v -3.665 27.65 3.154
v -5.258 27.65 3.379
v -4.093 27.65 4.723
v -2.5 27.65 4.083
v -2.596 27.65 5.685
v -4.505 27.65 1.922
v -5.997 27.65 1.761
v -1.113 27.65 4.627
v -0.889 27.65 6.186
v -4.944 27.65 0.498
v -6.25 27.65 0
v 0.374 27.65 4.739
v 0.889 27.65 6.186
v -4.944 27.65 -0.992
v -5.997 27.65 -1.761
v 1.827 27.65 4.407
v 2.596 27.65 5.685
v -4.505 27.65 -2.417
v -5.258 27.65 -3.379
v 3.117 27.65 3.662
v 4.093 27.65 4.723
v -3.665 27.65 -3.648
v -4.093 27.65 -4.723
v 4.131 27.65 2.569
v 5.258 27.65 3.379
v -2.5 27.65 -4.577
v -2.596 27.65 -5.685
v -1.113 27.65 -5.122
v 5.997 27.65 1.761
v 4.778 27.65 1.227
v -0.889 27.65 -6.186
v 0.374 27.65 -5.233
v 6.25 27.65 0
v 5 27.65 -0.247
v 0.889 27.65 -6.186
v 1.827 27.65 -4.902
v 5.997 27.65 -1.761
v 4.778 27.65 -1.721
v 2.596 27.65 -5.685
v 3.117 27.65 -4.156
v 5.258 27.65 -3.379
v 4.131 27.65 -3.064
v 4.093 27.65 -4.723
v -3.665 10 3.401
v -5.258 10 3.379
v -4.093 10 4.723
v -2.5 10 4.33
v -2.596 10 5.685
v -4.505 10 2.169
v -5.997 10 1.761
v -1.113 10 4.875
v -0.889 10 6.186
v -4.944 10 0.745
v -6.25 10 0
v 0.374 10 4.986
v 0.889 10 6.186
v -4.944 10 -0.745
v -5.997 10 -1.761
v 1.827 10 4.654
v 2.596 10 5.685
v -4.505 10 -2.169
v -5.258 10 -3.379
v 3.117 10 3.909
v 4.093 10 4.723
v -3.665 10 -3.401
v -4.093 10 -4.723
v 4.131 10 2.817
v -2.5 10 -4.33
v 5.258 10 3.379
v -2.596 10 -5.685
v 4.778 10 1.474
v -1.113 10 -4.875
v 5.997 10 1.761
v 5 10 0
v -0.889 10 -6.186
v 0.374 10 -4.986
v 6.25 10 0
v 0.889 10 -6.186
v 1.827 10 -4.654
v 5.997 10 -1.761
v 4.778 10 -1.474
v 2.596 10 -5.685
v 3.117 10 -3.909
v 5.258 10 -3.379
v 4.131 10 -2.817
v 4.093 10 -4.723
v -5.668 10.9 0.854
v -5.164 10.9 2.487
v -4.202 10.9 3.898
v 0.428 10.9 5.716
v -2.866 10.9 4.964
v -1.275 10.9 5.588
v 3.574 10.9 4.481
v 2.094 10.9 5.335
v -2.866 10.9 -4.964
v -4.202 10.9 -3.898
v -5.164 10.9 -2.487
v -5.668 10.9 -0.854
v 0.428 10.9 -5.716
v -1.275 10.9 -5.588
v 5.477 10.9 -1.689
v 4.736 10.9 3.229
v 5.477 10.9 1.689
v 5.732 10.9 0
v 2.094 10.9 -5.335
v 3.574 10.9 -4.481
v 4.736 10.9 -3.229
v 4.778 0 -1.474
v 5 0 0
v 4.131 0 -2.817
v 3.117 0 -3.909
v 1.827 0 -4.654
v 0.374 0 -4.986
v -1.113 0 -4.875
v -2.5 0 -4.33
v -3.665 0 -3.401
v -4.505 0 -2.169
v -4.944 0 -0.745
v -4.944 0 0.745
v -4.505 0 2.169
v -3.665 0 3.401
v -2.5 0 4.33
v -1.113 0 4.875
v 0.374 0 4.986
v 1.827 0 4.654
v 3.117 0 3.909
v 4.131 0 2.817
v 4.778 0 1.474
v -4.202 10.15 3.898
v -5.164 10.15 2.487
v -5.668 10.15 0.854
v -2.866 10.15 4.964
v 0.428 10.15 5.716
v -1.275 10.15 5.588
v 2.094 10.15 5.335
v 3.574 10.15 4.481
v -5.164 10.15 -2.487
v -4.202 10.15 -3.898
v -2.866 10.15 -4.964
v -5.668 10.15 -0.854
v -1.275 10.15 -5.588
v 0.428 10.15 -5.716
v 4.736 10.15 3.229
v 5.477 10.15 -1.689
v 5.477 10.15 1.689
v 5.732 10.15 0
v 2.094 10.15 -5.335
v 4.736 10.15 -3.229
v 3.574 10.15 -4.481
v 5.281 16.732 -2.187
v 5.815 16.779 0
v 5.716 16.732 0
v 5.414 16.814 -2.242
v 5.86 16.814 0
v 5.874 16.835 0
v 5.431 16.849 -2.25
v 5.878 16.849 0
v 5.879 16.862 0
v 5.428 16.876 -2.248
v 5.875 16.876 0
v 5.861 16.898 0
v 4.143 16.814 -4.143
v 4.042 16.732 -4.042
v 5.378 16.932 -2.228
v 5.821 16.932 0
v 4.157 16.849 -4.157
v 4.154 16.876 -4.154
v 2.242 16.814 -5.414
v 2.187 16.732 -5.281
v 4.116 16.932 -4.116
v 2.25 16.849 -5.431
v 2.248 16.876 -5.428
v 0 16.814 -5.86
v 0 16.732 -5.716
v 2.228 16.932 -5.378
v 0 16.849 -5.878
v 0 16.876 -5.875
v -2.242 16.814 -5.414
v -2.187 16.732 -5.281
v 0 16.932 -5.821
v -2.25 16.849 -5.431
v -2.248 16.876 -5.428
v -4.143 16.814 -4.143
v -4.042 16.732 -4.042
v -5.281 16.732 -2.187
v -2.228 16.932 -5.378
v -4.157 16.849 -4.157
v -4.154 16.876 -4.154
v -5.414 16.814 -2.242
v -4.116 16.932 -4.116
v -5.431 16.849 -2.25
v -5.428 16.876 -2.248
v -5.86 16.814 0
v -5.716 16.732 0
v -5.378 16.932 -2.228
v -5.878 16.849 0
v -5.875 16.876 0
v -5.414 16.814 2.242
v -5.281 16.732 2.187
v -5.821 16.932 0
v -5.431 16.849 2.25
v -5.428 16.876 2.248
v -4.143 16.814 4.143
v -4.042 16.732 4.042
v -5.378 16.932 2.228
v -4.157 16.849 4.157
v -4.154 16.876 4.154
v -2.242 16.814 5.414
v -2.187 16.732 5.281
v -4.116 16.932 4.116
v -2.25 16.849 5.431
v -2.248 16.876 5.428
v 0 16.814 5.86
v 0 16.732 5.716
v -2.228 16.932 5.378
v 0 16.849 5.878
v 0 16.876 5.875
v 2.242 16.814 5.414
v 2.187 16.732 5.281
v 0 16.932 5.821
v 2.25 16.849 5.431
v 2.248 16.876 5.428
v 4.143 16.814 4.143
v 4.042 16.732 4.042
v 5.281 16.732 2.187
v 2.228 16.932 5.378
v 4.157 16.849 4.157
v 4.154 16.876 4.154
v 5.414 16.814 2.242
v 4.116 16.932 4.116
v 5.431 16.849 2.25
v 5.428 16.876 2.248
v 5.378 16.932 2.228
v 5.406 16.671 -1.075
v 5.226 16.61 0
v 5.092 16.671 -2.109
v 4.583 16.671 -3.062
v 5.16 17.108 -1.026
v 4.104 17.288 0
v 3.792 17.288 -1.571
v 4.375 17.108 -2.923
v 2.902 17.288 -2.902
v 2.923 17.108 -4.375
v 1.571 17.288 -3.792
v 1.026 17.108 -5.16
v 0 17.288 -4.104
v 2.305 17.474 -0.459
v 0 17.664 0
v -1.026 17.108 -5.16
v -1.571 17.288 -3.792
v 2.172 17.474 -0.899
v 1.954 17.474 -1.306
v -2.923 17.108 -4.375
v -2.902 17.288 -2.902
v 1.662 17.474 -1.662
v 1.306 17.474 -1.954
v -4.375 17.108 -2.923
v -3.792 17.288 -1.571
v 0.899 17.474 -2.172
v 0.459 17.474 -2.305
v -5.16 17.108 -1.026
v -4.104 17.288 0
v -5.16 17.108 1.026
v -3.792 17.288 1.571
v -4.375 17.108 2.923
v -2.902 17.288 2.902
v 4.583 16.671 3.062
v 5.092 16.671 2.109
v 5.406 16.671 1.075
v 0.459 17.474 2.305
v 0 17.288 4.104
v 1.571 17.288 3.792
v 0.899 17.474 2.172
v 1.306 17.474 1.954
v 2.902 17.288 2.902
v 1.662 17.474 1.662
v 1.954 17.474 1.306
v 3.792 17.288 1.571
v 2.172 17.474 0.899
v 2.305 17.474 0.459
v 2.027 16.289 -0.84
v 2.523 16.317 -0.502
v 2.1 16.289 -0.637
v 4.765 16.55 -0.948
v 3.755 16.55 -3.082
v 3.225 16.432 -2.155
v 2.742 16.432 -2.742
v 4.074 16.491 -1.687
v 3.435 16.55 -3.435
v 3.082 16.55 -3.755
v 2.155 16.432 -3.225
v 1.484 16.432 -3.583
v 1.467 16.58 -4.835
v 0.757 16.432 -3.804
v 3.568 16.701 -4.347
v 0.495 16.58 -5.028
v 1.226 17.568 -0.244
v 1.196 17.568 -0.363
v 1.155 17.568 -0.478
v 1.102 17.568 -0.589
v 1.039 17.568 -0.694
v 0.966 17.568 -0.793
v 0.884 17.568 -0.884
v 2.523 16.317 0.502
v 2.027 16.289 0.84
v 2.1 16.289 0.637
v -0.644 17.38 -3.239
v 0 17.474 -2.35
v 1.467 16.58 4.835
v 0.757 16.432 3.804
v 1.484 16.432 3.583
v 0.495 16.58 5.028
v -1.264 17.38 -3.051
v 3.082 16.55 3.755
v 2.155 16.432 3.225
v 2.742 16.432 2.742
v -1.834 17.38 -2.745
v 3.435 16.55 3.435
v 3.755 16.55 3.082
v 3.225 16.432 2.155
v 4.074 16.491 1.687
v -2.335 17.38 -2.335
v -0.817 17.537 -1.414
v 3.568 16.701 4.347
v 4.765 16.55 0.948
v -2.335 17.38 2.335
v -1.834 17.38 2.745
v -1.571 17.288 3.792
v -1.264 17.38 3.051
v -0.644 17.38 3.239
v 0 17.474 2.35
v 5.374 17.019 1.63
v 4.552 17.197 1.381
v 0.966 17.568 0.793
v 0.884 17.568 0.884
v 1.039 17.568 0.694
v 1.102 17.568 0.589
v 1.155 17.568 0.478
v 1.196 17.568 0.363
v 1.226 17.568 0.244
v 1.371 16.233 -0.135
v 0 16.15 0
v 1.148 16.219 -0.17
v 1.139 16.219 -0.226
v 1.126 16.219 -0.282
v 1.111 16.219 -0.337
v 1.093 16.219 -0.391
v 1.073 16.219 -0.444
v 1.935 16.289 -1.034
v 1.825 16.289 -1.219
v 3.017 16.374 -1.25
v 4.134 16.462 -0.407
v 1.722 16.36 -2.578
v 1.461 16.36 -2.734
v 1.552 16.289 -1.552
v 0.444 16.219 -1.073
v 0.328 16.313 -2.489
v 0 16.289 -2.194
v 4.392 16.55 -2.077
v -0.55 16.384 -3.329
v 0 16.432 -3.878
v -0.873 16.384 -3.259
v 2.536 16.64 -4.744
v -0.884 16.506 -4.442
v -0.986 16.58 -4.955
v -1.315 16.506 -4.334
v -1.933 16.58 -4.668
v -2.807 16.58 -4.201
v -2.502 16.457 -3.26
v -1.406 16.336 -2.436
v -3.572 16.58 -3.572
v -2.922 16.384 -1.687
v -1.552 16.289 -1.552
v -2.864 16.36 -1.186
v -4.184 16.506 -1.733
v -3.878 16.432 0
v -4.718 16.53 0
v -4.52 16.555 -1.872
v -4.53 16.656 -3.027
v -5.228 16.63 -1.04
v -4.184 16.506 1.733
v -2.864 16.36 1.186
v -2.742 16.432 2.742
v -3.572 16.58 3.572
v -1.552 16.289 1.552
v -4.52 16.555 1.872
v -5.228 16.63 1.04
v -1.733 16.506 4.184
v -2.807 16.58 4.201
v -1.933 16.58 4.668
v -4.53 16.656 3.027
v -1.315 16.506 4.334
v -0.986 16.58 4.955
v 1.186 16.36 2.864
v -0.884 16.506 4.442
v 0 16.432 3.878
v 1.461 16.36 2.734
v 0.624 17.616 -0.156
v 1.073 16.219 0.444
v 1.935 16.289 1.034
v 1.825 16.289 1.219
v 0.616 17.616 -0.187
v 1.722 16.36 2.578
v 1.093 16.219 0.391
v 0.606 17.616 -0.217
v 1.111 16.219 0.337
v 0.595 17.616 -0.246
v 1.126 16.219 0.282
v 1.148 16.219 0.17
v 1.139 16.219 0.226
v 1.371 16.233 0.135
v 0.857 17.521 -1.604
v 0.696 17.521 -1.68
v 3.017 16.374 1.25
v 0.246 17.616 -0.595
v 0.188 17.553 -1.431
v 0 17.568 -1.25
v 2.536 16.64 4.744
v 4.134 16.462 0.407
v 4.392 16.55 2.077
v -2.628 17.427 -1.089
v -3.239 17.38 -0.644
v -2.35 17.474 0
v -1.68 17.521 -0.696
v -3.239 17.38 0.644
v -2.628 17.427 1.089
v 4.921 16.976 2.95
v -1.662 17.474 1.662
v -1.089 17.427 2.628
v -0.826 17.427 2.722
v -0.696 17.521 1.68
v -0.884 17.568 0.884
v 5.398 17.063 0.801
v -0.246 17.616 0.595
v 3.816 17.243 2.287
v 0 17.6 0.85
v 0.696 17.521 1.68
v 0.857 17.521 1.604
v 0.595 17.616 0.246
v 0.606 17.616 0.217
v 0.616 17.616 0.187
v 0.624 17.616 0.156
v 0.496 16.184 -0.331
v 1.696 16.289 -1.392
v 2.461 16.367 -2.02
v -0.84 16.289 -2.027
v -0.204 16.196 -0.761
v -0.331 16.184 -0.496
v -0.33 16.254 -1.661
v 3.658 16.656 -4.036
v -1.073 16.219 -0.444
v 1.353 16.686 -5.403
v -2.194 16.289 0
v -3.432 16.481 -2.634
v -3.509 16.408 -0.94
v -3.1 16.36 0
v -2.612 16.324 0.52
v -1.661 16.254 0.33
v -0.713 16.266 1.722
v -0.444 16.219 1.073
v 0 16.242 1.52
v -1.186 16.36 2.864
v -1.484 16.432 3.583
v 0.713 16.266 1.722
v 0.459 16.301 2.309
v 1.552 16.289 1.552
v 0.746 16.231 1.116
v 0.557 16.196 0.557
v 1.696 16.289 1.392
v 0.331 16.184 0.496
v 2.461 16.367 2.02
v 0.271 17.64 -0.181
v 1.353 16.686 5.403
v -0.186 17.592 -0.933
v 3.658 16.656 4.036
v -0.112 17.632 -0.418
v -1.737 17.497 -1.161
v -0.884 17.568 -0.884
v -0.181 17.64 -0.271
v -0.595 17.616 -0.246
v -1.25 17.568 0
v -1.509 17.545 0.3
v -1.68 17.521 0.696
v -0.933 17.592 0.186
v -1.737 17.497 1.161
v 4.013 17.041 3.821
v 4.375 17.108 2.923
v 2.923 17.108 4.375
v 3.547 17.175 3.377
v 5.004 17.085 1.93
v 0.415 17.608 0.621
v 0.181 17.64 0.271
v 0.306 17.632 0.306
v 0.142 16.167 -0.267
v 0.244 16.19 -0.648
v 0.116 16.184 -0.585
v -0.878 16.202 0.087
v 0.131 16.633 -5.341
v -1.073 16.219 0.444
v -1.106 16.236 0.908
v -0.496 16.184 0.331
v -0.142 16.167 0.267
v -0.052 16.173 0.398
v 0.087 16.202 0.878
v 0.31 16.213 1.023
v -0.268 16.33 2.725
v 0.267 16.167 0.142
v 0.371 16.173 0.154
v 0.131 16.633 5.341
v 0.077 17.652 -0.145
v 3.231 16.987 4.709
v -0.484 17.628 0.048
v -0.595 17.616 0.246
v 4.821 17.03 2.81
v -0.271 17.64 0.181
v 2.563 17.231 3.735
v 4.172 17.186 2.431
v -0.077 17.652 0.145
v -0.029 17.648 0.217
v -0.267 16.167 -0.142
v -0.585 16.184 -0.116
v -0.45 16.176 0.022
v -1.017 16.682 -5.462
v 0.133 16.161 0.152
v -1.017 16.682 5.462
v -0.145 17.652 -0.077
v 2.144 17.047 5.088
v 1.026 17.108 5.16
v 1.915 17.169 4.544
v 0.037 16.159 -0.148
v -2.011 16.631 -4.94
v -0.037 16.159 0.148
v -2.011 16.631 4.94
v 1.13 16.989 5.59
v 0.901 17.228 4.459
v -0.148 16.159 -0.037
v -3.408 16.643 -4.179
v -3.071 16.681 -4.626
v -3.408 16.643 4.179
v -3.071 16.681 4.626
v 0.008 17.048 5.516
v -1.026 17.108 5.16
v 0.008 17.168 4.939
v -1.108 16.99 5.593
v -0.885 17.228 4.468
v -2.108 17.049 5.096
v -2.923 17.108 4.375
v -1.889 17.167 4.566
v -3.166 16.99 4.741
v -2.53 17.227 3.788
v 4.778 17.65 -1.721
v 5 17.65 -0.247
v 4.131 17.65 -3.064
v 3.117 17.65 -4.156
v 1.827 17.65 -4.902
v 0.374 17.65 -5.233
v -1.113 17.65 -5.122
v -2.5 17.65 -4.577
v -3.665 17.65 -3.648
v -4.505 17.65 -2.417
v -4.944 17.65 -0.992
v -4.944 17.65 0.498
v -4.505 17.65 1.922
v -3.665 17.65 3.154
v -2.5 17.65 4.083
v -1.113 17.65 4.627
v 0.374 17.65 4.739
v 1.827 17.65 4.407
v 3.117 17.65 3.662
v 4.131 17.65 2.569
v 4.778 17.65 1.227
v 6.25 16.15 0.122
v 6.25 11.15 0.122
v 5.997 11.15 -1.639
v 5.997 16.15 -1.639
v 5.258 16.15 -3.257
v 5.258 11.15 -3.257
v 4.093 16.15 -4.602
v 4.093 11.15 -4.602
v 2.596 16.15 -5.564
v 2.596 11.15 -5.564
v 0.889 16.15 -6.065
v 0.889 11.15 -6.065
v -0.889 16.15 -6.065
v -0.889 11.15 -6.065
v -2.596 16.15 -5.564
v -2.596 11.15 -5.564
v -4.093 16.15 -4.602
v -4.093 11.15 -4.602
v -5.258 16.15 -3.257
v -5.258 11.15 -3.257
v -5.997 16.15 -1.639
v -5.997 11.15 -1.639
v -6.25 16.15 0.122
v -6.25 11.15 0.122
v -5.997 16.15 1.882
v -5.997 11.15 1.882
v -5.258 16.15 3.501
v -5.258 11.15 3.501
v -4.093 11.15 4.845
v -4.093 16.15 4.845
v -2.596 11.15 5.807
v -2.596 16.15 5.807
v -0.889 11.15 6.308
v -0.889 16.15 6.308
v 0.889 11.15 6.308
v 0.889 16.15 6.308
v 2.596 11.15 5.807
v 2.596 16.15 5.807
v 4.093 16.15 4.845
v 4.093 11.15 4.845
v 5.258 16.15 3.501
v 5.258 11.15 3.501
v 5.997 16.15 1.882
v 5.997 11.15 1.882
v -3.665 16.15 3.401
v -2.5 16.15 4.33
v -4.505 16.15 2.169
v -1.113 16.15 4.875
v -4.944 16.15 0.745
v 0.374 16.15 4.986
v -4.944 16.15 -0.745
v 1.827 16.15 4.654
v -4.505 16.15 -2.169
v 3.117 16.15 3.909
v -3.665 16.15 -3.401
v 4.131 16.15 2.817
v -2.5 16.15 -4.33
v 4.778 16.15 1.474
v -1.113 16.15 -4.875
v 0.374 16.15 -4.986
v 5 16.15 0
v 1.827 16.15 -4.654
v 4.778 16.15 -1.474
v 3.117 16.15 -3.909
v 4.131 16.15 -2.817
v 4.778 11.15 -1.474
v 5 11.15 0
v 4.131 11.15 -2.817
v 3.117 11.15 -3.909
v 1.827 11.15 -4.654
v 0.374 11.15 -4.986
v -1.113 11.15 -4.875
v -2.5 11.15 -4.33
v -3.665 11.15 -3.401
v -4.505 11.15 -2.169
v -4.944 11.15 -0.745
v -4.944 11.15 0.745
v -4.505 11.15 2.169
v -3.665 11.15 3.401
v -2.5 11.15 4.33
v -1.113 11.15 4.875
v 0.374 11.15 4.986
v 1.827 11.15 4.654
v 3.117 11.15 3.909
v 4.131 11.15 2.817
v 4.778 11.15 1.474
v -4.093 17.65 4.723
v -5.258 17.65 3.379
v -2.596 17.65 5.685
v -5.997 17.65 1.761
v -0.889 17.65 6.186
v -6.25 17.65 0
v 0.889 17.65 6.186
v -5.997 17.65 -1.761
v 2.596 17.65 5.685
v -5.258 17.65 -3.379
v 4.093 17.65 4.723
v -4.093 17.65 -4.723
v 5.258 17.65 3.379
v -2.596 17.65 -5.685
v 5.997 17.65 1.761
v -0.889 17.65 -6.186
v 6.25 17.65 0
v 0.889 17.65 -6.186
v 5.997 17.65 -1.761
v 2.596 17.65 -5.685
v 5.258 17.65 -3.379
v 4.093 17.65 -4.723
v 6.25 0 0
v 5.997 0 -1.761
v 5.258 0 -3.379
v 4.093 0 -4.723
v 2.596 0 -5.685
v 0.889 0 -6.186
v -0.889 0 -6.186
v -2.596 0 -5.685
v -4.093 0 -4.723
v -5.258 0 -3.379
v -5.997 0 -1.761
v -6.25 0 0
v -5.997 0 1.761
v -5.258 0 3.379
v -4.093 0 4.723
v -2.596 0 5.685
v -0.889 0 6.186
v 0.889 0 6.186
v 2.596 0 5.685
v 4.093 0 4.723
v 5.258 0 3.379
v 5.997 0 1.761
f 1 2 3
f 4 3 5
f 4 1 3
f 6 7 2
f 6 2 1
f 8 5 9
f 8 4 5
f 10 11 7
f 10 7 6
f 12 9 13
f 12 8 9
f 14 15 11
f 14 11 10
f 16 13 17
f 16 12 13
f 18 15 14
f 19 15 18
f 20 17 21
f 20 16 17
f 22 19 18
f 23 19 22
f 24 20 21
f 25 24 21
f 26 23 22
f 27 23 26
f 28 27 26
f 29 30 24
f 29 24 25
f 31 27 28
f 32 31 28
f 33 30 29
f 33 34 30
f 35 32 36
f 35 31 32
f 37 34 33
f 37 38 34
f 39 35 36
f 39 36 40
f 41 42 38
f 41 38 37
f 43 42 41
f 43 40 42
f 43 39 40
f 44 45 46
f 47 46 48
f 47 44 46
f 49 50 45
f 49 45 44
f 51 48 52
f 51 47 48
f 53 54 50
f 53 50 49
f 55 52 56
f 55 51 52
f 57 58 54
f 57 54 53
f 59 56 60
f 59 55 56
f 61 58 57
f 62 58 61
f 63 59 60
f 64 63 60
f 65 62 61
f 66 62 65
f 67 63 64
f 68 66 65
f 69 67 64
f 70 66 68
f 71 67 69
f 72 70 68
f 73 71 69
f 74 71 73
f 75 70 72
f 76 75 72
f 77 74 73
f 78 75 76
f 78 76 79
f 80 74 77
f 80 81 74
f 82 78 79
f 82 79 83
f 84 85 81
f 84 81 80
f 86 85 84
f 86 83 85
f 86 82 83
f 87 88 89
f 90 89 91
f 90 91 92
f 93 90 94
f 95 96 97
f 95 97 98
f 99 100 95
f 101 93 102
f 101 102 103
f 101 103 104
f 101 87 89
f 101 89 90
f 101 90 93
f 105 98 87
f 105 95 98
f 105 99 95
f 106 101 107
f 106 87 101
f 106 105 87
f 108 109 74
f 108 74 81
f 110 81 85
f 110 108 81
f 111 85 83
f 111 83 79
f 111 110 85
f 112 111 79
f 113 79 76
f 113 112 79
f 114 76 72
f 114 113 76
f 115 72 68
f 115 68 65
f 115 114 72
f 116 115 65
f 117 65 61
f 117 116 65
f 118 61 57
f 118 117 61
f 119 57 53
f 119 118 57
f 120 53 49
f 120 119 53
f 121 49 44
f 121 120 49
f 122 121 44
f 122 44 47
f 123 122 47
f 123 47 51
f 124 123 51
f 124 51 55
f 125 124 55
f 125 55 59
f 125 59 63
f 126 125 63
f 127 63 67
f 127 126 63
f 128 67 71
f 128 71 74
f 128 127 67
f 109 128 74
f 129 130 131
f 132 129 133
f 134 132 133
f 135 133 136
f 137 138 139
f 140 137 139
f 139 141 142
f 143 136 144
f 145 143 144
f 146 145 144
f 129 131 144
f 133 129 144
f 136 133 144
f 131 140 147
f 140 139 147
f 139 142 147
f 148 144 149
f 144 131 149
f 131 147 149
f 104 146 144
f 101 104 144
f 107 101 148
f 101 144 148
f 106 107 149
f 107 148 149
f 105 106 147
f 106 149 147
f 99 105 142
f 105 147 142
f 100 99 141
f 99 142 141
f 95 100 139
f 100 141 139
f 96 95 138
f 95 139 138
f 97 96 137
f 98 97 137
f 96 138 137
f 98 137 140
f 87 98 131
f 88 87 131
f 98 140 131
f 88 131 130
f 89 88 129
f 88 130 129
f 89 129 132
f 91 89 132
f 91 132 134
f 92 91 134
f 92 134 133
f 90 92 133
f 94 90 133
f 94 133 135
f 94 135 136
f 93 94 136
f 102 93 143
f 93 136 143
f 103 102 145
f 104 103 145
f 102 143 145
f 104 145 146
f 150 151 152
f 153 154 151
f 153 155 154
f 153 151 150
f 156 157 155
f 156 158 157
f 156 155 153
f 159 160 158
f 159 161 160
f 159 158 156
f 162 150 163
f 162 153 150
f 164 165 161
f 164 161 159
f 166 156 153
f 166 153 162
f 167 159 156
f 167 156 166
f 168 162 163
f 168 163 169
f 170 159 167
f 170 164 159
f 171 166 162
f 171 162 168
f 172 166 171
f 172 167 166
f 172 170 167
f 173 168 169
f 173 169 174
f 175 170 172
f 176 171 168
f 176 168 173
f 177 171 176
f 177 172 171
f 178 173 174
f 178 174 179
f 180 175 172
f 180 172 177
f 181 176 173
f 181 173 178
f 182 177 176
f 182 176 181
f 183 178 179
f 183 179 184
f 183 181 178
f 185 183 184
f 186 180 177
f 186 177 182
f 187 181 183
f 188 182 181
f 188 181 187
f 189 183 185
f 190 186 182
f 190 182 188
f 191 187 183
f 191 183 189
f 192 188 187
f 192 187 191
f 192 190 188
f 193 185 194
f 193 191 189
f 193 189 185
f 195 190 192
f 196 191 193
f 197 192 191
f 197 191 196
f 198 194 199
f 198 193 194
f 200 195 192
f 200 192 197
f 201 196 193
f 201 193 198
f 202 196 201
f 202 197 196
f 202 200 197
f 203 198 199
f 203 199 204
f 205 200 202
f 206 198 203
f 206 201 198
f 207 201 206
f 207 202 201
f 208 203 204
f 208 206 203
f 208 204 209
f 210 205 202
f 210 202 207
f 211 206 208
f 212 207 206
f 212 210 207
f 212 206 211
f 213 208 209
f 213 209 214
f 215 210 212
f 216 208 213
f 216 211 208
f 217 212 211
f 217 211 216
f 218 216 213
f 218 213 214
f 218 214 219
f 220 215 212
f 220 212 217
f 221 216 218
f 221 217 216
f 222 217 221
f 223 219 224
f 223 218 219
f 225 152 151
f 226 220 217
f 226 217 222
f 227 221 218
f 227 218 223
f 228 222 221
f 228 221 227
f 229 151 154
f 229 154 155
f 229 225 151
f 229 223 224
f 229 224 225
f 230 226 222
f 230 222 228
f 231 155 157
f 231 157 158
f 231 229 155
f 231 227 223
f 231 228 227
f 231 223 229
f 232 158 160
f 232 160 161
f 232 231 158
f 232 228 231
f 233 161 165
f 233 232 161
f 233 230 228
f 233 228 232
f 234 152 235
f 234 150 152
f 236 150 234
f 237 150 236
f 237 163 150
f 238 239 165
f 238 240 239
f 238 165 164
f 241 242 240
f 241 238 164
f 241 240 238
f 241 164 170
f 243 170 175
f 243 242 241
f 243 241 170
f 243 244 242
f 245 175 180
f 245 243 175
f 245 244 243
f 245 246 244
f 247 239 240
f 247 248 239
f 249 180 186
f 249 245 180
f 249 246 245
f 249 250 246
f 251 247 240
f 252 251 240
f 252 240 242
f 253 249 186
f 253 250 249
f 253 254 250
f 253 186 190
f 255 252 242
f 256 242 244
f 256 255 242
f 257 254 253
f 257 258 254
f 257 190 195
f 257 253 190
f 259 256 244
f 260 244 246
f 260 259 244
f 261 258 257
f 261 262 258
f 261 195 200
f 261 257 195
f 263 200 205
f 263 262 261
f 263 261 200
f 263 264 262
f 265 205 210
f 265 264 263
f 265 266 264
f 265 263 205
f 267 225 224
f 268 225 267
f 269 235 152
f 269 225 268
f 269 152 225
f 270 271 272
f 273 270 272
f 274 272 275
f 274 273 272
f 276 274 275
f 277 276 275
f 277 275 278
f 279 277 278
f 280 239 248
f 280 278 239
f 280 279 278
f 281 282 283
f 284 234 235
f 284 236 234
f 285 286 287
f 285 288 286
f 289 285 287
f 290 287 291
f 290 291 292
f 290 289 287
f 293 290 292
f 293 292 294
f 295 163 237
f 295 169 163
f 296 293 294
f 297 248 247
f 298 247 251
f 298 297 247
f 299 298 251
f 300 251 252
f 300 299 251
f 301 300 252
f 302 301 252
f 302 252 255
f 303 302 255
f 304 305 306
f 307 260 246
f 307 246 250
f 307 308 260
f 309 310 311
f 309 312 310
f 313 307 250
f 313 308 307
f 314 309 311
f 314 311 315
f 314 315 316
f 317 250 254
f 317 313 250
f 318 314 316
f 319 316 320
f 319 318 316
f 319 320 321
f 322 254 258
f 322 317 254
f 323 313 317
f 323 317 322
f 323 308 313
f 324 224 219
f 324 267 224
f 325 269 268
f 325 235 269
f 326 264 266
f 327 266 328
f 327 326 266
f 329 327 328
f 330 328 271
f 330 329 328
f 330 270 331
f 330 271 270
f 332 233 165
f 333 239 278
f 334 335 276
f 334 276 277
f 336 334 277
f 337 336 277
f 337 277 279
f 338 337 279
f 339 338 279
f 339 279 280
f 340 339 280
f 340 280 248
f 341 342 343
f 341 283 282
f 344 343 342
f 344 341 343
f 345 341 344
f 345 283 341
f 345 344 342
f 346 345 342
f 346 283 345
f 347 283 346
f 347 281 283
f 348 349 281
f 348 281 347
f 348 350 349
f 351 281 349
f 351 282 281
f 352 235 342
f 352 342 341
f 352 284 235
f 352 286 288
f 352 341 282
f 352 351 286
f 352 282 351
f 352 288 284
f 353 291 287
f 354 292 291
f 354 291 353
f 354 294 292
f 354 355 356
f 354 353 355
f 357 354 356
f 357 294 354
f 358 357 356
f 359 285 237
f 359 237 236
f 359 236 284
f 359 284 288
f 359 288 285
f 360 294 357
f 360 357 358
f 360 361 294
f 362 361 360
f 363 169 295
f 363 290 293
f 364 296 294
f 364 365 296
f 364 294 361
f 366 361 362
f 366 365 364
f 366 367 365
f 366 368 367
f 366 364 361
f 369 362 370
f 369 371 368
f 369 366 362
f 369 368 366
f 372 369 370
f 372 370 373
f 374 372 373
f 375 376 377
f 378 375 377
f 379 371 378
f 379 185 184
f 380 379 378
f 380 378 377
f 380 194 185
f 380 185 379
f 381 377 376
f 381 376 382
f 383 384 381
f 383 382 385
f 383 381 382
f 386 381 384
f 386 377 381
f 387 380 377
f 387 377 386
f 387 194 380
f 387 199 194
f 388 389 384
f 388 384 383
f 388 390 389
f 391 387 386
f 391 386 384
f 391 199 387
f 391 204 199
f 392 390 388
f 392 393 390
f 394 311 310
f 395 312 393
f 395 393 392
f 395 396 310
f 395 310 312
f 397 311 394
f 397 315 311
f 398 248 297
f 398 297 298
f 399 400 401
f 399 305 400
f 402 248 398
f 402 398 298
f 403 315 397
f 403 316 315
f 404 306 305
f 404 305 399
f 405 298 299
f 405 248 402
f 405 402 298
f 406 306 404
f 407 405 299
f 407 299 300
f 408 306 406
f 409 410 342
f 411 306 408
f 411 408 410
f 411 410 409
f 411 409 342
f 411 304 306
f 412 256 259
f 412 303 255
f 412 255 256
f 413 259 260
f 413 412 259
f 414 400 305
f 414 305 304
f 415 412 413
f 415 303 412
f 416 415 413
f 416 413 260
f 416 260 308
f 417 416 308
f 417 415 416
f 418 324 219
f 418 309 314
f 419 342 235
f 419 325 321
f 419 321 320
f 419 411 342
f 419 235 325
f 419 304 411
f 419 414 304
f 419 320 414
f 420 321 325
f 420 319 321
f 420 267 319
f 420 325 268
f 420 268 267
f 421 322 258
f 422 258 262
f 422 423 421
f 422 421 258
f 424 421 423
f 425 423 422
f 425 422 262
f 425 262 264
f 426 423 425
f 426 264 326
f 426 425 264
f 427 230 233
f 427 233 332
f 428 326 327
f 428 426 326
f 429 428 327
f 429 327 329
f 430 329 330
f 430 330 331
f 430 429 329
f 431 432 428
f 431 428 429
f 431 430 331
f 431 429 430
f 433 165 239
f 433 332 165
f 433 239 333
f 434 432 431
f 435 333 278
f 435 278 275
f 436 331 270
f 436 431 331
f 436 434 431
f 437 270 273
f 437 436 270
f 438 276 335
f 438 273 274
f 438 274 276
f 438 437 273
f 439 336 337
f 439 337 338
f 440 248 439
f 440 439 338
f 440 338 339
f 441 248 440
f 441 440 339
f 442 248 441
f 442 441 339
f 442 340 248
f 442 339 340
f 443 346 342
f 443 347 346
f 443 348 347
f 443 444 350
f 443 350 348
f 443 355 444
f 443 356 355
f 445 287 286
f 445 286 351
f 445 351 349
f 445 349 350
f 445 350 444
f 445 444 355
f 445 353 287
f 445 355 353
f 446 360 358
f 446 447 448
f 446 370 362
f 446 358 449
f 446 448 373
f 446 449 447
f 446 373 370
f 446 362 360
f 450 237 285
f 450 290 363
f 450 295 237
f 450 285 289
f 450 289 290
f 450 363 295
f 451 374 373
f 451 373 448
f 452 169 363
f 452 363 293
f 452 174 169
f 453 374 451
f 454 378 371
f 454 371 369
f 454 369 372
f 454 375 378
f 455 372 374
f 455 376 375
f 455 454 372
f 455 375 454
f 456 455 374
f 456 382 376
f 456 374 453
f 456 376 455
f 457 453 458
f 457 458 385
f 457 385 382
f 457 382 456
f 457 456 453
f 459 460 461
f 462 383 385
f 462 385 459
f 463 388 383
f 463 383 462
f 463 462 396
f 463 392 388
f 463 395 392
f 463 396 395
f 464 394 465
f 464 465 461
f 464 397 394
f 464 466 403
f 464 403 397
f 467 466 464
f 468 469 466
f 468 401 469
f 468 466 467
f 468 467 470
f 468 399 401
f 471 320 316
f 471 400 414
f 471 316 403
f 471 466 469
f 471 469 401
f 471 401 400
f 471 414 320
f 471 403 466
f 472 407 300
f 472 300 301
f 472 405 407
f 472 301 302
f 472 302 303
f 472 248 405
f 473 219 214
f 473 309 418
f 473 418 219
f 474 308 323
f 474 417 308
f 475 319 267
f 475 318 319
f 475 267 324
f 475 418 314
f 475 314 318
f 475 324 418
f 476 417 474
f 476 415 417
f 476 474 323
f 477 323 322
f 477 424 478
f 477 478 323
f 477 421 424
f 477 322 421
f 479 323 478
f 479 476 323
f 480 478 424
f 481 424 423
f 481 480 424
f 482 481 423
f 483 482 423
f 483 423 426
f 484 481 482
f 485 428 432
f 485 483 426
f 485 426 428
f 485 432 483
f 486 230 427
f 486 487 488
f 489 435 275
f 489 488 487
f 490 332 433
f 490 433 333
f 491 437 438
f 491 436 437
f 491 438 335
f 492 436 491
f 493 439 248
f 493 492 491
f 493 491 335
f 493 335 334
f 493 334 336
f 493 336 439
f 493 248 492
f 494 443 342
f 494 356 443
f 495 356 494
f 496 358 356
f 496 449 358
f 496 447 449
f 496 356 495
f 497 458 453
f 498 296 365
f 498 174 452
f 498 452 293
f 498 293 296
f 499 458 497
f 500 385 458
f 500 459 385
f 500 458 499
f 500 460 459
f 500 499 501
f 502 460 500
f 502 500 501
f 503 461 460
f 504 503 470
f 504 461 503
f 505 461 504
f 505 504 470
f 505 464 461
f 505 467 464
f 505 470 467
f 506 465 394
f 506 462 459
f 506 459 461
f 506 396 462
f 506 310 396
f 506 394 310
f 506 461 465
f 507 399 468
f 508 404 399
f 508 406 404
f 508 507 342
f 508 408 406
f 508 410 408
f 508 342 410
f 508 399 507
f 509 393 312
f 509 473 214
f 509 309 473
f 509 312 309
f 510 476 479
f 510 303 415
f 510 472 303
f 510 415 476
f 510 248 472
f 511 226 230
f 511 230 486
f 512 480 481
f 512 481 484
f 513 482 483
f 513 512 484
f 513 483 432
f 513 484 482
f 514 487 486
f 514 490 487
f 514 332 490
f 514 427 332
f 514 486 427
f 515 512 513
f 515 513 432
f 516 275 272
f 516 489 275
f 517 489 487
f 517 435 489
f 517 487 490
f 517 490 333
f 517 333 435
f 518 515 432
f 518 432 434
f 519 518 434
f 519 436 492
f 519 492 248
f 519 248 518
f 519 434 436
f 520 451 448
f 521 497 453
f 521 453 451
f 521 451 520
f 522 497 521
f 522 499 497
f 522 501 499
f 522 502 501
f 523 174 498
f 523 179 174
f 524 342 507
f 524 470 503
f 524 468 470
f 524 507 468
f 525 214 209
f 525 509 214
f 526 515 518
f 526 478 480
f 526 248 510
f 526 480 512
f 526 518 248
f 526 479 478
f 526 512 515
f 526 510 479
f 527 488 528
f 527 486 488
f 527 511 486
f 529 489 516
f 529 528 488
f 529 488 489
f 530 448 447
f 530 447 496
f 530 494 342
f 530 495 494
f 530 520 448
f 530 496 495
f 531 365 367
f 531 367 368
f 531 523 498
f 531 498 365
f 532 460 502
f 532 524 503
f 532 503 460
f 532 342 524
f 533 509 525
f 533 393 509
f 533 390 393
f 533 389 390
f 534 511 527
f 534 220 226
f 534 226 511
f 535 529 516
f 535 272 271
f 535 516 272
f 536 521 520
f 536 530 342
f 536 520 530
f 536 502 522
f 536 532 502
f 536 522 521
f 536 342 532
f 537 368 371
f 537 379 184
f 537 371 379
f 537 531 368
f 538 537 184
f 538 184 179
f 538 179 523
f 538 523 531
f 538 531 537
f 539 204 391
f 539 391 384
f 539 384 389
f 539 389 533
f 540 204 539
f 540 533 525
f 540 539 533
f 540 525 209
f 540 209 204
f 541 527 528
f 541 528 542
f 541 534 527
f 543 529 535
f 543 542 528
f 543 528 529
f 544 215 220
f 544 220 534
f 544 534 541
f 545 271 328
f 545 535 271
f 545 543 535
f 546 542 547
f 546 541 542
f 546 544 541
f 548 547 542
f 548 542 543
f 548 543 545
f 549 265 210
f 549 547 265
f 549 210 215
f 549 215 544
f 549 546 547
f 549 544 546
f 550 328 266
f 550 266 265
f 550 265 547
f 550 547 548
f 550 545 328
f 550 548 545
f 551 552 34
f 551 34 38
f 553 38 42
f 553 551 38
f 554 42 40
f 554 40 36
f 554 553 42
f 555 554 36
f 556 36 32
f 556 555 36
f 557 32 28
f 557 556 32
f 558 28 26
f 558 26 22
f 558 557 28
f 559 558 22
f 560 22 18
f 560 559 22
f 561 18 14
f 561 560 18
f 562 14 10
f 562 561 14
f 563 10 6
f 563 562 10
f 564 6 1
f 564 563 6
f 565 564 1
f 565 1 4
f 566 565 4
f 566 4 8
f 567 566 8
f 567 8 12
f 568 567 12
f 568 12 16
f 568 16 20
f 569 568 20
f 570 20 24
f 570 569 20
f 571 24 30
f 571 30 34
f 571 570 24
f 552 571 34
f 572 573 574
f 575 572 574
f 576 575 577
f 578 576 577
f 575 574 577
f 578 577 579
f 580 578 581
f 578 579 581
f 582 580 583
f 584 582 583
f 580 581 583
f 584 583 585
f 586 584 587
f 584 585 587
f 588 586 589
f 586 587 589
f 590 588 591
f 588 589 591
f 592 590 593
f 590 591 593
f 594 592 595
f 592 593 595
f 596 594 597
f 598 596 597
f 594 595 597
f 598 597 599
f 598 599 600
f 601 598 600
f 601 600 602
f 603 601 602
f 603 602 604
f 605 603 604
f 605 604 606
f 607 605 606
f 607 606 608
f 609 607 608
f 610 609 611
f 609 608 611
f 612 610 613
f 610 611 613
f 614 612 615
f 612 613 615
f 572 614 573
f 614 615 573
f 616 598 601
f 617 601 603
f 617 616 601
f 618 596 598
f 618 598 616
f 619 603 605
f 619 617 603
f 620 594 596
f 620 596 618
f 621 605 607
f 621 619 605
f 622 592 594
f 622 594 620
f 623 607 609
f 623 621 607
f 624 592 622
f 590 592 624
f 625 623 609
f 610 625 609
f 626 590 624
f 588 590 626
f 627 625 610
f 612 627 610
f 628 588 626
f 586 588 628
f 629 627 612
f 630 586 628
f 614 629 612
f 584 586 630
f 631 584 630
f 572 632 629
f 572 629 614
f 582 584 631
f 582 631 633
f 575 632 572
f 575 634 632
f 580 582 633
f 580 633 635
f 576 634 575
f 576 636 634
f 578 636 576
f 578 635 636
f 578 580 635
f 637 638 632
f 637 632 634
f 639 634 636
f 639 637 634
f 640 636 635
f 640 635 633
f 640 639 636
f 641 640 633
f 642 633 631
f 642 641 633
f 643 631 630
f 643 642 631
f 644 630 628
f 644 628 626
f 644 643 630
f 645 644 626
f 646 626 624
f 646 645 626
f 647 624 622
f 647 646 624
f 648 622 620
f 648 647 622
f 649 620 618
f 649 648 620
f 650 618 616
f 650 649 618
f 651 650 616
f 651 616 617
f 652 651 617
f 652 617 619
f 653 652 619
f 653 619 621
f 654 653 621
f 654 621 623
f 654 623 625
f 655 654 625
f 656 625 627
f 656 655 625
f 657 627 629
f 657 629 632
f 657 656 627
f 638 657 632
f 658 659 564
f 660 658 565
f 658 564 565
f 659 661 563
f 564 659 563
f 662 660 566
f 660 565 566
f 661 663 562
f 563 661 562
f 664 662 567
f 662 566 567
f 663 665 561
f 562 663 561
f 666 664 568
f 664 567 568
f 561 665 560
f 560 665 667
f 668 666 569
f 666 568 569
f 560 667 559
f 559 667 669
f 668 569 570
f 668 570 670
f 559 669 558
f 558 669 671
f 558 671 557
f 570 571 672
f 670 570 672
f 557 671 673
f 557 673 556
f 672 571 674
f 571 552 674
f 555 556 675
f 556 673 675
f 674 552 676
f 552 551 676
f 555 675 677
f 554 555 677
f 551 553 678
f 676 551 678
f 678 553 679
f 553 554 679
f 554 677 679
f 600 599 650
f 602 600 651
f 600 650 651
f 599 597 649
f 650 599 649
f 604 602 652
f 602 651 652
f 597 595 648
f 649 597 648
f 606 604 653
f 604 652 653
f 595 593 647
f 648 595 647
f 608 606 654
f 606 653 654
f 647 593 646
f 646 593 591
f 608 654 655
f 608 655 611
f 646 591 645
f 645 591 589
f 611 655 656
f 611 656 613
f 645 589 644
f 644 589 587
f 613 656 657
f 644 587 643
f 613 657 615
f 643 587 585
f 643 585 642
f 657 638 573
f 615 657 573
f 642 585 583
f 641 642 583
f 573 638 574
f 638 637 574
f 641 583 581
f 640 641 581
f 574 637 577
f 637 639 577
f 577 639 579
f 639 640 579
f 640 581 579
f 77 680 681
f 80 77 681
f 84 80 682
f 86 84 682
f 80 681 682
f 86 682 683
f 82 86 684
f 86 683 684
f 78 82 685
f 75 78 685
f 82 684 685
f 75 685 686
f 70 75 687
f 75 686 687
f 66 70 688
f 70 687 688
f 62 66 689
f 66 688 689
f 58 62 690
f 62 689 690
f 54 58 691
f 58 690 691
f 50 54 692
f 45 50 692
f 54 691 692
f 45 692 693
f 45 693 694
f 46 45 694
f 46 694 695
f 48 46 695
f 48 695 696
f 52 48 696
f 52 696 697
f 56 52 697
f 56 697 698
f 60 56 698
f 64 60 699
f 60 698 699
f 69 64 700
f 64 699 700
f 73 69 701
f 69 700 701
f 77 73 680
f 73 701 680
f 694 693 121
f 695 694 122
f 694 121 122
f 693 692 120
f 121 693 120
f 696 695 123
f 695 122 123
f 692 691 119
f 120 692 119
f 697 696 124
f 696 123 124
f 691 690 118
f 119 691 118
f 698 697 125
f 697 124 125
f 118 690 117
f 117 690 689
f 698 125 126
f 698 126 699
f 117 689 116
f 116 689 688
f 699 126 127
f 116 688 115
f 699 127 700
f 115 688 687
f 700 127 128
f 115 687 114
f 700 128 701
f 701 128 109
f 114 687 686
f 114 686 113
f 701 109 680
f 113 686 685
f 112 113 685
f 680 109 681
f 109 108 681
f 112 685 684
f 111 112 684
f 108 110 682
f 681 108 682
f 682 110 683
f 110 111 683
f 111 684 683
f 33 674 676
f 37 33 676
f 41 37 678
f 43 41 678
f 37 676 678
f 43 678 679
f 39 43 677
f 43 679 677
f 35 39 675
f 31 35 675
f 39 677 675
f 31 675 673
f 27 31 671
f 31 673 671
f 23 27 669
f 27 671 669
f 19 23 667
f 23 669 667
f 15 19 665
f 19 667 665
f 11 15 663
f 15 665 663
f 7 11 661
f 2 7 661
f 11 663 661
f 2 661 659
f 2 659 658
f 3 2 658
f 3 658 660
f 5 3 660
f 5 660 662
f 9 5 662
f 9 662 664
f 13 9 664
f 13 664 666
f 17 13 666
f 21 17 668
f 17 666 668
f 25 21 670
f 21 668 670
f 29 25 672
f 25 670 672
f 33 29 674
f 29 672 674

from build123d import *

# Parameters (mm, degrees)
SKETCH_2_R      = 6.25
SKETCH_2_R_2    = 5
EXTRUDE_1_DEPTH = 10
EXTRUDE_START   = 0.15
SKETCH_3_R      = 5.731622833
EXTRUDE_2_DEPTH = 0.75
EXTRUDE_START_2 = 0.25
SKETCH_4_R      = 6.25
SKETCH_4_R_2    = 5
EXTRUDE_3_DEPTH = 5
EXTRUDE_START_3 = 1.5
SKETCH_6_R      = 6.25
SKETCH_6_R_2    = 5
EXTRUDE_4_DEPTH = 10


with BuildPart() as part:
    # 草图2 → 凸台-拉伸1 (new body)
    with BuildSketch(Plane(origin=(0, 0, 0), x_dir=(1, 0, 0), z_dir=(0, 1, 0))):
        Circle(SKETCH_2_R)
        Circle(SKETCH_2_R_2, mode=Mode.SUBTRACT)
    extrude(amount=EXTRUDE_1_DEPTH)


with BuildPart() as body_2:
    # 草图3 → 凸台-拉伸2 (new body)
    with BuildSketch(Plane(origin=(0, 10, 0), x_dir=(1, 0, 0), z_dir=(0, 1, 0)).offset(EXTRUDE_START)):
        Circle(SKETCH_3_R)
    extrude(amount=EXTRUDE_2_DEPTH)


with BuildPart() as body_3:
    # 草图4 → 凸台-拉伸3 (new body)
    with BuildSketch(Plane(origin=(0, 10.9, 0), x_dir=(1, 0, 0), z_dir=(0, 1, 0)).offset(EXTRUDE_START_2)):
        with Locations((0, -0.121569805)):
            Circle(SKETCH_4_R)
        Circle(SKETCH_4_R_2, mode=Mode.SUBTRACT)
    extrude(amount=EXTRUDE_3_DEPTH)


with BuildPart() as body_4:
    # 草图5 → 旋转1 (revolve)
    with BuildSketch(Plane.XY):
        with BuildLine():
            Line((0, 17.664448142), (0, 16.15))
            add(Edge.make_bspline(
                [(0, 16.15), (11.757782886, 16.806663198), (0, 17.664448142)],
                knots=[0, 0, 0, 1, 1, 1], degree=2))
        make_face()
    revolve(axis=Axis((0, 0, 0), (0, 1, 0)))


with BuildPart() as body_5:
    # 草图6 → 凸台-拉伸4 (new body)
    with BuildSketch(Plane(origin=(0, 16.15, 0), x_dir=(1, 0, 0), z_dir=(0, 1, 0)).offset(EXTRUDE_START_3)):
        Circle(SKETCH_6_R)
        with Locations((0, 0.247187806)):
            Circle(SKETCH_6_R_2, mode=Mode.SUBTRACT)
    extrude(amount=EXTRUDE_4_DEPTH)


solid = Compound([part.part, body_2.part, body_3.part, body_4.part, body_5.part])
